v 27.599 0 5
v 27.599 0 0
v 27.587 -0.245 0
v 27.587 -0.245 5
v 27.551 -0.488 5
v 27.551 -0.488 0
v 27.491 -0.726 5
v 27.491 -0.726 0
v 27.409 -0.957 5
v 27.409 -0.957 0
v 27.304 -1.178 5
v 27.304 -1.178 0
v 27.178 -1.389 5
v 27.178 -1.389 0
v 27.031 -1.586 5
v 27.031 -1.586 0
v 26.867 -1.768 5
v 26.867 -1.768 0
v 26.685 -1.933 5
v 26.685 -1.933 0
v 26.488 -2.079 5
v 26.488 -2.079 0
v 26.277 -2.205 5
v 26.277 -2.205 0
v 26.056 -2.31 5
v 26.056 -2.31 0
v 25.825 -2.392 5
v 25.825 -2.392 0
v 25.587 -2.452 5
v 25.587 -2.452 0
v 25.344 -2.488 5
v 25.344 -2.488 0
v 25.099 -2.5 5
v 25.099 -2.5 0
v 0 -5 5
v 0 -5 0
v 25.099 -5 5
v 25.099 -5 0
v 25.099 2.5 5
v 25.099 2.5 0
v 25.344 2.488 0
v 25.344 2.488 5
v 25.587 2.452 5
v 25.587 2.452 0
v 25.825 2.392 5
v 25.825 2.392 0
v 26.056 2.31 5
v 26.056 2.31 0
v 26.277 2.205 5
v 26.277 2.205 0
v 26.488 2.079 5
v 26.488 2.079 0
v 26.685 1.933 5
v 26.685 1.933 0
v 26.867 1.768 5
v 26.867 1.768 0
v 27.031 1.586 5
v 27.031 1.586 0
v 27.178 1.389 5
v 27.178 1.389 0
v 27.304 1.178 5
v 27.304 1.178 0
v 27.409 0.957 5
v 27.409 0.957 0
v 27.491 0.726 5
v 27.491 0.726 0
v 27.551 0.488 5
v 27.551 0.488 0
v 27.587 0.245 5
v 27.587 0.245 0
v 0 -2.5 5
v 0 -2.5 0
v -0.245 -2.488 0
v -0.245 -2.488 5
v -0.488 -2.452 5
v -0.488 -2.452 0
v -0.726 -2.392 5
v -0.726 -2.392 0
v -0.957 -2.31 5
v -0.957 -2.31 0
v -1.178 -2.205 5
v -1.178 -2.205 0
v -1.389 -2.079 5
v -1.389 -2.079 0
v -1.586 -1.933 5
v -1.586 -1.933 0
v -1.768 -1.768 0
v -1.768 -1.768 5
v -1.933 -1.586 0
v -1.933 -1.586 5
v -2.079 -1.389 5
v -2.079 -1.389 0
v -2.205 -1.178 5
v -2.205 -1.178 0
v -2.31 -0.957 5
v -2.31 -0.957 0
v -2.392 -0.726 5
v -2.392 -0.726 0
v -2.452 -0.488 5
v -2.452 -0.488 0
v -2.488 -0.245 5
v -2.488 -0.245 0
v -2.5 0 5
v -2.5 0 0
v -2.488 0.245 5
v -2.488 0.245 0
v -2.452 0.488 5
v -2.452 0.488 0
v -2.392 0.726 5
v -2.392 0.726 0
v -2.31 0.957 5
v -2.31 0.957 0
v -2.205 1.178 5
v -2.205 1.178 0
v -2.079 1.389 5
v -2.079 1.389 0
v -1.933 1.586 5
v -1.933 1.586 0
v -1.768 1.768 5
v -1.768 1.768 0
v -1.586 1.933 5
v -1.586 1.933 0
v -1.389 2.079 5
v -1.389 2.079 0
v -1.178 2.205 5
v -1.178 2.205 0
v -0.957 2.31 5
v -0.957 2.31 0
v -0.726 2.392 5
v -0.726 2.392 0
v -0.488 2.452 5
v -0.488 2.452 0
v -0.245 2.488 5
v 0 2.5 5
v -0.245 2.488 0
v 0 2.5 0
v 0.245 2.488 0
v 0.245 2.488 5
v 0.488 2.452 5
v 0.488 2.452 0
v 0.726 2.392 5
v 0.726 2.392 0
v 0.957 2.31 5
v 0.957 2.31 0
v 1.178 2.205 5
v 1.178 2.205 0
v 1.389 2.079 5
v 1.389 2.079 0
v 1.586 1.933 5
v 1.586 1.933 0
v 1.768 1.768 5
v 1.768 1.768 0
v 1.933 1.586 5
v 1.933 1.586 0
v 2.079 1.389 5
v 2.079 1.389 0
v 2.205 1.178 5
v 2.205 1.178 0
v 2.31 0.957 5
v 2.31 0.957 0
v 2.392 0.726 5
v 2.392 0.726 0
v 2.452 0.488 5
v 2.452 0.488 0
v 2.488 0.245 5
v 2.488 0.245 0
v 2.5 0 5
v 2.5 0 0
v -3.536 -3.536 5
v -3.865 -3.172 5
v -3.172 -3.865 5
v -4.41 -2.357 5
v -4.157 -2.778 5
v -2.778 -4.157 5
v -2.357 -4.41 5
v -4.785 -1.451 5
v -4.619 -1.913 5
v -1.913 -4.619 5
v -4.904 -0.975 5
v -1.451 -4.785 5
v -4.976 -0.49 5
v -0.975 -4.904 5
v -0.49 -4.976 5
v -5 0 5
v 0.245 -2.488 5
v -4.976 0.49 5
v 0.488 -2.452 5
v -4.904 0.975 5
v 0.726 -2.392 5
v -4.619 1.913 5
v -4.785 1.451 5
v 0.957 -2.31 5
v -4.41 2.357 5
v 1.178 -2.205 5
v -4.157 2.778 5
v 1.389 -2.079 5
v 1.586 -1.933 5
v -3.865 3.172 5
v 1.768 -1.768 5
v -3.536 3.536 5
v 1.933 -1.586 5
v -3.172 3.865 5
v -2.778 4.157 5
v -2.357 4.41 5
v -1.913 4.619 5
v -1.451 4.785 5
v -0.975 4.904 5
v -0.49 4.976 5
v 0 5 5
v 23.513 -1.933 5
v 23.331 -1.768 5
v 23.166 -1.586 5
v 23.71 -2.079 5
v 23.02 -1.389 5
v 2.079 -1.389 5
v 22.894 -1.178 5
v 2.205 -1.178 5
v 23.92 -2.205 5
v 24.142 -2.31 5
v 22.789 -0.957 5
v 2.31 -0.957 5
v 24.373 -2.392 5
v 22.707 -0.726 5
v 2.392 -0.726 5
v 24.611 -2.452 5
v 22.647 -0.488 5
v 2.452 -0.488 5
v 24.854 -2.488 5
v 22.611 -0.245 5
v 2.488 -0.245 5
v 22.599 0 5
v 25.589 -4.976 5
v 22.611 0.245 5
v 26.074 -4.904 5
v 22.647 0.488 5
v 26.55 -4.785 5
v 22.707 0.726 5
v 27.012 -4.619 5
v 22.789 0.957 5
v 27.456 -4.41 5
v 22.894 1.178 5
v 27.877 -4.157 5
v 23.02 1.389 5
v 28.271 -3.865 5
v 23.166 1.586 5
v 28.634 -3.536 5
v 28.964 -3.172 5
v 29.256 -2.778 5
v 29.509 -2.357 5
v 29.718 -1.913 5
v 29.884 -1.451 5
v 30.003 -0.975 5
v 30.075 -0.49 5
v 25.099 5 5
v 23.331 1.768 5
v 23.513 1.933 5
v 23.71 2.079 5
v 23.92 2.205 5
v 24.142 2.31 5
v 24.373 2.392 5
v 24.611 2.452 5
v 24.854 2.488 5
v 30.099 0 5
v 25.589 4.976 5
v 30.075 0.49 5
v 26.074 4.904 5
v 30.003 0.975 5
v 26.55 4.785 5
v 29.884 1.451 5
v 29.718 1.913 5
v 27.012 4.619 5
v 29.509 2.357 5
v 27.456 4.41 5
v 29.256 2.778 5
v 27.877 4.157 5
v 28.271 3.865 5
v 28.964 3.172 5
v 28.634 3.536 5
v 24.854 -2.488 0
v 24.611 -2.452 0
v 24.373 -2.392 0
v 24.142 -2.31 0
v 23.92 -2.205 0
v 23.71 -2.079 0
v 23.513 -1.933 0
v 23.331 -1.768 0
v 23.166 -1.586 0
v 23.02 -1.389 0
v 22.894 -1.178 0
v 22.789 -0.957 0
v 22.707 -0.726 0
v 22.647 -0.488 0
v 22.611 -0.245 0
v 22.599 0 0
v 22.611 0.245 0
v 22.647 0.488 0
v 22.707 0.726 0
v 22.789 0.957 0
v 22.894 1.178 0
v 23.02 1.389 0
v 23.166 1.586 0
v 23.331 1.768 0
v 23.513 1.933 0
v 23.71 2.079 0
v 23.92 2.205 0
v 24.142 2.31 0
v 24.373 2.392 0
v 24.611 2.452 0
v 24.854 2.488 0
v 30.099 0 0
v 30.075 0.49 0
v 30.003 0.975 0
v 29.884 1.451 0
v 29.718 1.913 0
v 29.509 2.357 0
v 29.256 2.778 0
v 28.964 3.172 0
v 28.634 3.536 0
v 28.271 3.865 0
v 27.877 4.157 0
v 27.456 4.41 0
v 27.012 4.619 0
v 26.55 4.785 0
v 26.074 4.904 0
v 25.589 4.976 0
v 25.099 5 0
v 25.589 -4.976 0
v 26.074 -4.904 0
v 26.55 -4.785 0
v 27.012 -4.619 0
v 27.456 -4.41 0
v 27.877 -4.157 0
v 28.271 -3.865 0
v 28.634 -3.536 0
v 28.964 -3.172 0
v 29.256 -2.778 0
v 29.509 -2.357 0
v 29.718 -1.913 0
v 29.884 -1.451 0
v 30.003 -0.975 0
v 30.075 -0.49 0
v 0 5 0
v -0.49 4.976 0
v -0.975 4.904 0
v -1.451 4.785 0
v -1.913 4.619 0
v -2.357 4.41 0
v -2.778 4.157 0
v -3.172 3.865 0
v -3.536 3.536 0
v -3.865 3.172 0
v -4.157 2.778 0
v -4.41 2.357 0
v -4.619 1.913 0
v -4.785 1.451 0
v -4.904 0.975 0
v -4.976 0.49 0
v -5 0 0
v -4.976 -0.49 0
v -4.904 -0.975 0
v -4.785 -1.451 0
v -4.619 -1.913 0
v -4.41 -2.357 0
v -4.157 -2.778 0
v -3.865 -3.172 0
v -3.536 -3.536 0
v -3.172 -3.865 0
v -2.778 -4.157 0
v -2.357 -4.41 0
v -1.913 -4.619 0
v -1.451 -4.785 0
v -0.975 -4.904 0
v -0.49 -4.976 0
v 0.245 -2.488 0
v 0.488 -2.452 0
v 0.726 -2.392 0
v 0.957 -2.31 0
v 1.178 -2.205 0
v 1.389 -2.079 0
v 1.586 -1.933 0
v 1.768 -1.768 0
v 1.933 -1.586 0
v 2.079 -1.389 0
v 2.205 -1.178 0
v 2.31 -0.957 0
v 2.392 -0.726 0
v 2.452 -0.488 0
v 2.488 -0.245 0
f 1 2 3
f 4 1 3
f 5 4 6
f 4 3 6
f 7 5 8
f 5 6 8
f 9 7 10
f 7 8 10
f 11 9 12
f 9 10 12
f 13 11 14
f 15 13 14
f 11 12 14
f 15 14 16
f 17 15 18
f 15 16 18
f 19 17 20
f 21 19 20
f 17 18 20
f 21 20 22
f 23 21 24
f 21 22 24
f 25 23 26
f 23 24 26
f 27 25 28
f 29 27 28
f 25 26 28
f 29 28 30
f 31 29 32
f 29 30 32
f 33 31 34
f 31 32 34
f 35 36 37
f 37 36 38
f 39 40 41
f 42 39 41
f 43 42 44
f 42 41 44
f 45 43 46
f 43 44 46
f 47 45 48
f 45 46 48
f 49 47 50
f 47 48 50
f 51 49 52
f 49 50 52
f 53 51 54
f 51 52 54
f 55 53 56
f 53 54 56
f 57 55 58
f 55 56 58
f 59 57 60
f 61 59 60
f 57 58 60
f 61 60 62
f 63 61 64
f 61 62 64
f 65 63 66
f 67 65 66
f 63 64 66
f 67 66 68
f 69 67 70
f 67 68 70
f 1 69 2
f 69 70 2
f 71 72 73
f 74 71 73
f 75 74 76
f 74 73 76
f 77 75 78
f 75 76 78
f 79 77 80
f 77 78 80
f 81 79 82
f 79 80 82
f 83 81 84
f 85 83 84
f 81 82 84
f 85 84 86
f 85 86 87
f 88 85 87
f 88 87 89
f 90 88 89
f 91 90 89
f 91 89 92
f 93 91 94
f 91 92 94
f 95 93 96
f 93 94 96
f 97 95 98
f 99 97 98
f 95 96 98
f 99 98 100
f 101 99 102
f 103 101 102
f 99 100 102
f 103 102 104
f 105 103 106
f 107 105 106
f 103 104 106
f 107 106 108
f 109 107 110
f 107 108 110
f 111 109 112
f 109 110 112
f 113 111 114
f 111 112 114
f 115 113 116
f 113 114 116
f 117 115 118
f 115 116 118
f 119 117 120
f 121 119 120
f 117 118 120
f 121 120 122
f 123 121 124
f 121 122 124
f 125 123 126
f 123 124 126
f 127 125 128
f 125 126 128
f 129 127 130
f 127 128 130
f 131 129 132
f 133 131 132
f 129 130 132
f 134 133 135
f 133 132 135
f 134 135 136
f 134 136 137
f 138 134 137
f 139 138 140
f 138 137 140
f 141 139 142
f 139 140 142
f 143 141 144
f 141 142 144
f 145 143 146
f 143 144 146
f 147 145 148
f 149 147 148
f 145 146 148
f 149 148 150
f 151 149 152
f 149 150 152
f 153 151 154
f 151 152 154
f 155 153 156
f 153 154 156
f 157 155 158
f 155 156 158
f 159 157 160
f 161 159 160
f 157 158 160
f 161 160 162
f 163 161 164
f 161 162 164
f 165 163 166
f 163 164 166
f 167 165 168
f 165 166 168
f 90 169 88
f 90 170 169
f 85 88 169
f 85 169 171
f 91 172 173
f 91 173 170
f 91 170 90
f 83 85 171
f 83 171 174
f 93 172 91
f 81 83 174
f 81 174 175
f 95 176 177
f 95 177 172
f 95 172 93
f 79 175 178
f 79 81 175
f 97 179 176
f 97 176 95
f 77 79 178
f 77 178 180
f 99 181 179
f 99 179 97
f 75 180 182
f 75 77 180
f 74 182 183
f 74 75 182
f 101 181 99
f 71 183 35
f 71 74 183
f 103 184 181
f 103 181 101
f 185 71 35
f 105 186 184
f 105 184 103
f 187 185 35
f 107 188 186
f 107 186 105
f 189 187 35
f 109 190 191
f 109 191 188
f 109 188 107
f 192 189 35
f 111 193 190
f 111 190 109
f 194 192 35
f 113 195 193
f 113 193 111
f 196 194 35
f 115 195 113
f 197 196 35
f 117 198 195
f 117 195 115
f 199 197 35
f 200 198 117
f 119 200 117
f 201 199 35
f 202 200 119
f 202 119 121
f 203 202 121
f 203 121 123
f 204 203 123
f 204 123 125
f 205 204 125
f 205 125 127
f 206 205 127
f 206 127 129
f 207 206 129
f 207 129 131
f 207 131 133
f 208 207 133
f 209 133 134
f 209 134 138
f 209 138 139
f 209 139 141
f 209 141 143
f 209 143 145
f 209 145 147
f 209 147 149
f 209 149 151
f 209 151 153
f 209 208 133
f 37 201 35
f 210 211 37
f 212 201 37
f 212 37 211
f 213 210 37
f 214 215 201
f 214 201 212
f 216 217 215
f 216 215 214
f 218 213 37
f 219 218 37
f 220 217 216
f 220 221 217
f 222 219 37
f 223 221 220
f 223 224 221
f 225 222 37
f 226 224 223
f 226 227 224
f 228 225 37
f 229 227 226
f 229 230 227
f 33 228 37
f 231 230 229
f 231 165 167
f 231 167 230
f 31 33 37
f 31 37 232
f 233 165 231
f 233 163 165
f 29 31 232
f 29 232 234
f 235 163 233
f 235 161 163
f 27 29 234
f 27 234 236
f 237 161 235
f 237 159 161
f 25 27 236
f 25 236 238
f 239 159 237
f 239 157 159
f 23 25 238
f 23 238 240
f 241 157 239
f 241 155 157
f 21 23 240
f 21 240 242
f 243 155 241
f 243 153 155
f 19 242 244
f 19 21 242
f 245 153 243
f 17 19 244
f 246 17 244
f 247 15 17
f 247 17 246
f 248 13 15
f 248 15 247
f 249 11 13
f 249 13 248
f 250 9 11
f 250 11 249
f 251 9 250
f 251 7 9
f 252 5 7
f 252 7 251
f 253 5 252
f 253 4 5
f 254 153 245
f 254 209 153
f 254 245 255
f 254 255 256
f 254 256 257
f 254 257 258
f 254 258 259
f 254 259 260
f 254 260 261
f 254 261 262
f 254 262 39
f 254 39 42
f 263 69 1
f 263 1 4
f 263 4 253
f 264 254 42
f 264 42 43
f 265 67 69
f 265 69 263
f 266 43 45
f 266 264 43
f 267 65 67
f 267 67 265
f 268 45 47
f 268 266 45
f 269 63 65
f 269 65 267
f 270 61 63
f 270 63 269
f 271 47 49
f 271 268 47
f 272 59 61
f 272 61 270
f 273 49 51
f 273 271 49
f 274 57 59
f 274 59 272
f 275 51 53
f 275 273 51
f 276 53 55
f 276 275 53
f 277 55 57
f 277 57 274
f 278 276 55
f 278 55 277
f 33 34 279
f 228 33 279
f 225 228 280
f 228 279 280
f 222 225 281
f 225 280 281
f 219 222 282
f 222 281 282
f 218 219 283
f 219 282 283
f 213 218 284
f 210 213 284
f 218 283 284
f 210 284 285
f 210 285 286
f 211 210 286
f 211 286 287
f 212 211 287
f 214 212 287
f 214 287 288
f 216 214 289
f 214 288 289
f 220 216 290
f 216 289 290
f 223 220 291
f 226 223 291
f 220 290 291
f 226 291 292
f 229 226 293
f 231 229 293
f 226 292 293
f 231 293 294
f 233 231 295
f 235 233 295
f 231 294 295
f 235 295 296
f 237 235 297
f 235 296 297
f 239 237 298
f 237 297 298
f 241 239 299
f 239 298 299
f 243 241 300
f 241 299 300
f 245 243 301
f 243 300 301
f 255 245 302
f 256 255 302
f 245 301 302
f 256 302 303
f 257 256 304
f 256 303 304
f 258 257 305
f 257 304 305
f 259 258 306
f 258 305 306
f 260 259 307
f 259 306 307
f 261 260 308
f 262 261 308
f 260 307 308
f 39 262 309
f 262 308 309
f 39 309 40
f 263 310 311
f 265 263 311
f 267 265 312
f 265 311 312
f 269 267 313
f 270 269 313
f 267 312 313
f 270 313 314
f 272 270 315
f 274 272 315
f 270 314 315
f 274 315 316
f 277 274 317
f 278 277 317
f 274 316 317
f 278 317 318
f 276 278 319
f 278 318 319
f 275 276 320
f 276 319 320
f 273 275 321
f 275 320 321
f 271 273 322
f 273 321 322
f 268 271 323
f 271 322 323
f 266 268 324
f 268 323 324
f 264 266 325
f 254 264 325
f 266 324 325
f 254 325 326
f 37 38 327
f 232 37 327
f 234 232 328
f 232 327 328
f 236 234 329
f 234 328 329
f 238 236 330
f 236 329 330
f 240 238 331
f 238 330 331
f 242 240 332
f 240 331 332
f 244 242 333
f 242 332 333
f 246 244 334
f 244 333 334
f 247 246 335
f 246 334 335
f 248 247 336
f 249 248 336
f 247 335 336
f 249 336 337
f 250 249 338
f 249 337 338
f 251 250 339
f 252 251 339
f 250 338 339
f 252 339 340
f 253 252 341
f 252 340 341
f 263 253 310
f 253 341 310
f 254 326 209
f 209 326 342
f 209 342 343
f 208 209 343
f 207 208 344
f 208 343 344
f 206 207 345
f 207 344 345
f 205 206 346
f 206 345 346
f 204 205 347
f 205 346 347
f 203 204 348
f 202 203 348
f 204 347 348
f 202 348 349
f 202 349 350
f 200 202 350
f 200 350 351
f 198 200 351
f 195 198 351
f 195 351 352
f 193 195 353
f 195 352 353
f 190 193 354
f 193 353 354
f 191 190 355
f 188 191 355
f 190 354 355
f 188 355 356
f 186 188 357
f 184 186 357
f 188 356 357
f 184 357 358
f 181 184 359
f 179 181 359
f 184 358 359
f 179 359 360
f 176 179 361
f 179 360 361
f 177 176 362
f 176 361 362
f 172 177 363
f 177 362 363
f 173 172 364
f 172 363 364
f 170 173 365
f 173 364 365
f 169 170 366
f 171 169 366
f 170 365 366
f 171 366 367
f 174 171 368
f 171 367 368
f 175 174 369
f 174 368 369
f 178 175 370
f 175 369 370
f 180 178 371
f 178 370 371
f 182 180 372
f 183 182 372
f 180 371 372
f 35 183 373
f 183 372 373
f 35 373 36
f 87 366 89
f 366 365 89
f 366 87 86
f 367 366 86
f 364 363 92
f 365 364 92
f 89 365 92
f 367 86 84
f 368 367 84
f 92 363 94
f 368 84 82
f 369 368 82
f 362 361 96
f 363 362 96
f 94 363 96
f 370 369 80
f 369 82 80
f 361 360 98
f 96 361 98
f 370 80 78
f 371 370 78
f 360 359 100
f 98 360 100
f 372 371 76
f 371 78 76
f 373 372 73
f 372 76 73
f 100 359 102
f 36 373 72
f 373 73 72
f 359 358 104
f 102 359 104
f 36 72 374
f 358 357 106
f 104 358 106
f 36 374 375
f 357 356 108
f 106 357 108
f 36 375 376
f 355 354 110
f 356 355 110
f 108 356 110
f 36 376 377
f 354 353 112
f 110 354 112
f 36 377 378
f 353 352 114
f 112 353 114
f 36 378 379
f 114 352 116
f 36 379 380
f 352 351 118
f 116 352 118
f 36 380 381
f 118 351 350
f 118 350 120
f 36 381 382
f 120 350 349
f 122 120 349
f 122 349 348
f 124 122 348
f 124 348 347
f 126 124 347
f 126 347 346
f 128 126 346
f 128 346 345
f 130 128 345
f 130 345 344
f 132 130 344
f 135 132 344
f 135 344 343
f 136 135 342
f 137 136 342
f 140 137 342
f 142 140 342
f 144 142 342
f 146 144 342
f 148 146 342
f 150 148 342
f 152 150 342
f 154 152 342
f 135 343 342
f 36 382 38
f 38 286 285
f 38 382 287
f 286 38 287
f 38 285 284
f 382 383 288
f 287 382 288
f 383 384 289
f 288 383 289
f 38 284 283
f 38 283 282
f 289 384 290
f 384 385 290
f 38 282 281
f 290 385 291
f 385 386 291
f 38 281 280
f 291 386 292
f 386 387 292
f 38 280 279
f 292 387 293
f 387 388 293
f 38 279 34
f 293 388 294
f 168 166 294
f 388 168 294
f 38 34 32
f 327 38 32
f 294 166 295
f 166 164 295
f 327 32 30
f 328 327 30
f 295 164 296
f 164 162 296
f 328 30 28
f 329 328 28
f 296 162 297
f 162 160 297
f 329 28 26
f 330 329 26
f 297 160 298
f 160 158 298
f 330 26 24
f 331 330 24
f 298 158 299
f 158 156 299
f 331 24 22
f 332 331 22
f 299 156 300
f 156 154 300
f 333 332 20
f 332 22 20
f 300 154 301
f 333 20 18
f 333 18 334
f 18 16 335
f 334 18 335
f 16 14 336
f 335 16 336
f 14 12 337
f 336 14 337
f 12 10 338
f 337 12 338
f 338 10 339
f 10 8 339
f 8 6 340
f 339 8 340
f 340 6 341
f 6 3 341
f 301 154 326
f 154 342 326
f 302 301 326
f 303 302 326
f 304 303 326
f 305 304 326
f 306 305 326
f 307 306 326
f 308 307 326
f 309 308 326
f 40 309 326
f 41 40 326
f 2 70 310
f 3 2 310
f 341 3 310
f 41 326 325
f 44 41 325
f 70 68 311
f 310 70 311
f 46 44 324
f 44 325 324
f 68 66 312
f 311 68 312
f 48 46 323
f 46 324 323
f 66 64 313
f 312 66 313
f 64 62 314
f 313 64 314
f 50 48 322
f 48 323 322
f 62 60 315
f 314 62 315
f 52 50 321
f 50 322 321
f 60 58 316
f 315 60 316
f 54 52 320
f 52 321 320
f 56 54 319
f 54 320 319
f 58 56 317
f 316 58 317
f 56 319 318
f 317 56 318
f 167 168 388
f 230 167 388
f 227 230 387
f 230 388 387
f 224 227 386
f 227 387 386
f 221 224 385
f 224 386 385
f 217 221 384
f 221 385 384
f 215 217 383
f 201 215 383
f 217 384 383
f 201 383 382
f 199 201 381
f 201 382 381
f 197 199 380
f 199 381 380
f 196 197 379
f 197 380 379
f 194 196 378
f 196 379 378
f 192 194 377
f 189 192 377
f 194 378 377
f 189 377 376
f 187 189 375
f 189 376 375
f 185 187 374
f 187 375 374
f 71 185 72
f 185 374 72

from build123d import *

# Parameters (mm, degrees)
F1_DEPTH = 5


with BuildPart() as f1:
    # F0 (on Top) → F1 (new body)
    with BuildSketch(Plane.XY):
        with BuildLine():
            Line((0, 2.5), (0, 5))
            ThreePointArc((0, 5), (-5, 0), (0, -5))
            Line((0, -5), (0, -2.5))
            ThreePointArc((0, -2.5), (-2.5, 0), (0, 2.5))
        make_face()
        with BuildLine():
            ThreePointArc((0, -5), (3.535534, -3.535534), (5, 0))
            ThreePointArc((5, 0), (3.535534, 3.535534), (0, 5))
            Line((0, 5), (0, 2.5))
            ThreePointArc((0, 2.5), (1.767767, 1.767767), (2.5, 0))
            ThreePointArc((2.5, 0), (1.767767, -1.767767), (0, -2.5))
            Line((0, -2.5), (0, -5))
        make_face()
        with BuildLine():
            ThreePointArc((0, 5), (3.535534, 3.535534), (5, 0))
            ThreePointArc((5, 0), (3.535534, -3.535534), (0, -5))
            Line((0, -5), (25.098907, -5))
            ThreePointArc((25.098907, -5), (20.098907, 0), (25.098907, 5))
            Line((25.098907, 5), (0, 5))
        make_face()
        with BuildLine():
            Line((25.098907, 2.5), (25.098907, 5))
            ThreePointArc((25.098907, 5), (20.098907, 0), (25.098907, -5))
            Line((25.098907, -5), (25.098907, -2.5))
            ThreePointArc((25.098907, -2.5), (22.598907, 0), (25.098907, 2.5))
        make_face()
        with BuildLine():
            ThreePointArc((30.098907, 0), (28.634441, 3.535534), (25.098907, 5))
            Line((25.098907, 5), (25.098907, 2.5))
            ThreePointArc((25.098907, 2.5), (26.866674, 1.767767), (27.598907, 0))
            ThreePointArc((27.598907, 0), (26.866674, -1.767767), (25.098907, -2.5))
            Line((25.098907, -2.5), (25.098907, -5))
            ThreePointArc((25.098907, -5), (28.634441, -3.535534), (30.098907, 0))
        make_face()
    extrude(amount=F1_DEPTH)


solid = f1.part
